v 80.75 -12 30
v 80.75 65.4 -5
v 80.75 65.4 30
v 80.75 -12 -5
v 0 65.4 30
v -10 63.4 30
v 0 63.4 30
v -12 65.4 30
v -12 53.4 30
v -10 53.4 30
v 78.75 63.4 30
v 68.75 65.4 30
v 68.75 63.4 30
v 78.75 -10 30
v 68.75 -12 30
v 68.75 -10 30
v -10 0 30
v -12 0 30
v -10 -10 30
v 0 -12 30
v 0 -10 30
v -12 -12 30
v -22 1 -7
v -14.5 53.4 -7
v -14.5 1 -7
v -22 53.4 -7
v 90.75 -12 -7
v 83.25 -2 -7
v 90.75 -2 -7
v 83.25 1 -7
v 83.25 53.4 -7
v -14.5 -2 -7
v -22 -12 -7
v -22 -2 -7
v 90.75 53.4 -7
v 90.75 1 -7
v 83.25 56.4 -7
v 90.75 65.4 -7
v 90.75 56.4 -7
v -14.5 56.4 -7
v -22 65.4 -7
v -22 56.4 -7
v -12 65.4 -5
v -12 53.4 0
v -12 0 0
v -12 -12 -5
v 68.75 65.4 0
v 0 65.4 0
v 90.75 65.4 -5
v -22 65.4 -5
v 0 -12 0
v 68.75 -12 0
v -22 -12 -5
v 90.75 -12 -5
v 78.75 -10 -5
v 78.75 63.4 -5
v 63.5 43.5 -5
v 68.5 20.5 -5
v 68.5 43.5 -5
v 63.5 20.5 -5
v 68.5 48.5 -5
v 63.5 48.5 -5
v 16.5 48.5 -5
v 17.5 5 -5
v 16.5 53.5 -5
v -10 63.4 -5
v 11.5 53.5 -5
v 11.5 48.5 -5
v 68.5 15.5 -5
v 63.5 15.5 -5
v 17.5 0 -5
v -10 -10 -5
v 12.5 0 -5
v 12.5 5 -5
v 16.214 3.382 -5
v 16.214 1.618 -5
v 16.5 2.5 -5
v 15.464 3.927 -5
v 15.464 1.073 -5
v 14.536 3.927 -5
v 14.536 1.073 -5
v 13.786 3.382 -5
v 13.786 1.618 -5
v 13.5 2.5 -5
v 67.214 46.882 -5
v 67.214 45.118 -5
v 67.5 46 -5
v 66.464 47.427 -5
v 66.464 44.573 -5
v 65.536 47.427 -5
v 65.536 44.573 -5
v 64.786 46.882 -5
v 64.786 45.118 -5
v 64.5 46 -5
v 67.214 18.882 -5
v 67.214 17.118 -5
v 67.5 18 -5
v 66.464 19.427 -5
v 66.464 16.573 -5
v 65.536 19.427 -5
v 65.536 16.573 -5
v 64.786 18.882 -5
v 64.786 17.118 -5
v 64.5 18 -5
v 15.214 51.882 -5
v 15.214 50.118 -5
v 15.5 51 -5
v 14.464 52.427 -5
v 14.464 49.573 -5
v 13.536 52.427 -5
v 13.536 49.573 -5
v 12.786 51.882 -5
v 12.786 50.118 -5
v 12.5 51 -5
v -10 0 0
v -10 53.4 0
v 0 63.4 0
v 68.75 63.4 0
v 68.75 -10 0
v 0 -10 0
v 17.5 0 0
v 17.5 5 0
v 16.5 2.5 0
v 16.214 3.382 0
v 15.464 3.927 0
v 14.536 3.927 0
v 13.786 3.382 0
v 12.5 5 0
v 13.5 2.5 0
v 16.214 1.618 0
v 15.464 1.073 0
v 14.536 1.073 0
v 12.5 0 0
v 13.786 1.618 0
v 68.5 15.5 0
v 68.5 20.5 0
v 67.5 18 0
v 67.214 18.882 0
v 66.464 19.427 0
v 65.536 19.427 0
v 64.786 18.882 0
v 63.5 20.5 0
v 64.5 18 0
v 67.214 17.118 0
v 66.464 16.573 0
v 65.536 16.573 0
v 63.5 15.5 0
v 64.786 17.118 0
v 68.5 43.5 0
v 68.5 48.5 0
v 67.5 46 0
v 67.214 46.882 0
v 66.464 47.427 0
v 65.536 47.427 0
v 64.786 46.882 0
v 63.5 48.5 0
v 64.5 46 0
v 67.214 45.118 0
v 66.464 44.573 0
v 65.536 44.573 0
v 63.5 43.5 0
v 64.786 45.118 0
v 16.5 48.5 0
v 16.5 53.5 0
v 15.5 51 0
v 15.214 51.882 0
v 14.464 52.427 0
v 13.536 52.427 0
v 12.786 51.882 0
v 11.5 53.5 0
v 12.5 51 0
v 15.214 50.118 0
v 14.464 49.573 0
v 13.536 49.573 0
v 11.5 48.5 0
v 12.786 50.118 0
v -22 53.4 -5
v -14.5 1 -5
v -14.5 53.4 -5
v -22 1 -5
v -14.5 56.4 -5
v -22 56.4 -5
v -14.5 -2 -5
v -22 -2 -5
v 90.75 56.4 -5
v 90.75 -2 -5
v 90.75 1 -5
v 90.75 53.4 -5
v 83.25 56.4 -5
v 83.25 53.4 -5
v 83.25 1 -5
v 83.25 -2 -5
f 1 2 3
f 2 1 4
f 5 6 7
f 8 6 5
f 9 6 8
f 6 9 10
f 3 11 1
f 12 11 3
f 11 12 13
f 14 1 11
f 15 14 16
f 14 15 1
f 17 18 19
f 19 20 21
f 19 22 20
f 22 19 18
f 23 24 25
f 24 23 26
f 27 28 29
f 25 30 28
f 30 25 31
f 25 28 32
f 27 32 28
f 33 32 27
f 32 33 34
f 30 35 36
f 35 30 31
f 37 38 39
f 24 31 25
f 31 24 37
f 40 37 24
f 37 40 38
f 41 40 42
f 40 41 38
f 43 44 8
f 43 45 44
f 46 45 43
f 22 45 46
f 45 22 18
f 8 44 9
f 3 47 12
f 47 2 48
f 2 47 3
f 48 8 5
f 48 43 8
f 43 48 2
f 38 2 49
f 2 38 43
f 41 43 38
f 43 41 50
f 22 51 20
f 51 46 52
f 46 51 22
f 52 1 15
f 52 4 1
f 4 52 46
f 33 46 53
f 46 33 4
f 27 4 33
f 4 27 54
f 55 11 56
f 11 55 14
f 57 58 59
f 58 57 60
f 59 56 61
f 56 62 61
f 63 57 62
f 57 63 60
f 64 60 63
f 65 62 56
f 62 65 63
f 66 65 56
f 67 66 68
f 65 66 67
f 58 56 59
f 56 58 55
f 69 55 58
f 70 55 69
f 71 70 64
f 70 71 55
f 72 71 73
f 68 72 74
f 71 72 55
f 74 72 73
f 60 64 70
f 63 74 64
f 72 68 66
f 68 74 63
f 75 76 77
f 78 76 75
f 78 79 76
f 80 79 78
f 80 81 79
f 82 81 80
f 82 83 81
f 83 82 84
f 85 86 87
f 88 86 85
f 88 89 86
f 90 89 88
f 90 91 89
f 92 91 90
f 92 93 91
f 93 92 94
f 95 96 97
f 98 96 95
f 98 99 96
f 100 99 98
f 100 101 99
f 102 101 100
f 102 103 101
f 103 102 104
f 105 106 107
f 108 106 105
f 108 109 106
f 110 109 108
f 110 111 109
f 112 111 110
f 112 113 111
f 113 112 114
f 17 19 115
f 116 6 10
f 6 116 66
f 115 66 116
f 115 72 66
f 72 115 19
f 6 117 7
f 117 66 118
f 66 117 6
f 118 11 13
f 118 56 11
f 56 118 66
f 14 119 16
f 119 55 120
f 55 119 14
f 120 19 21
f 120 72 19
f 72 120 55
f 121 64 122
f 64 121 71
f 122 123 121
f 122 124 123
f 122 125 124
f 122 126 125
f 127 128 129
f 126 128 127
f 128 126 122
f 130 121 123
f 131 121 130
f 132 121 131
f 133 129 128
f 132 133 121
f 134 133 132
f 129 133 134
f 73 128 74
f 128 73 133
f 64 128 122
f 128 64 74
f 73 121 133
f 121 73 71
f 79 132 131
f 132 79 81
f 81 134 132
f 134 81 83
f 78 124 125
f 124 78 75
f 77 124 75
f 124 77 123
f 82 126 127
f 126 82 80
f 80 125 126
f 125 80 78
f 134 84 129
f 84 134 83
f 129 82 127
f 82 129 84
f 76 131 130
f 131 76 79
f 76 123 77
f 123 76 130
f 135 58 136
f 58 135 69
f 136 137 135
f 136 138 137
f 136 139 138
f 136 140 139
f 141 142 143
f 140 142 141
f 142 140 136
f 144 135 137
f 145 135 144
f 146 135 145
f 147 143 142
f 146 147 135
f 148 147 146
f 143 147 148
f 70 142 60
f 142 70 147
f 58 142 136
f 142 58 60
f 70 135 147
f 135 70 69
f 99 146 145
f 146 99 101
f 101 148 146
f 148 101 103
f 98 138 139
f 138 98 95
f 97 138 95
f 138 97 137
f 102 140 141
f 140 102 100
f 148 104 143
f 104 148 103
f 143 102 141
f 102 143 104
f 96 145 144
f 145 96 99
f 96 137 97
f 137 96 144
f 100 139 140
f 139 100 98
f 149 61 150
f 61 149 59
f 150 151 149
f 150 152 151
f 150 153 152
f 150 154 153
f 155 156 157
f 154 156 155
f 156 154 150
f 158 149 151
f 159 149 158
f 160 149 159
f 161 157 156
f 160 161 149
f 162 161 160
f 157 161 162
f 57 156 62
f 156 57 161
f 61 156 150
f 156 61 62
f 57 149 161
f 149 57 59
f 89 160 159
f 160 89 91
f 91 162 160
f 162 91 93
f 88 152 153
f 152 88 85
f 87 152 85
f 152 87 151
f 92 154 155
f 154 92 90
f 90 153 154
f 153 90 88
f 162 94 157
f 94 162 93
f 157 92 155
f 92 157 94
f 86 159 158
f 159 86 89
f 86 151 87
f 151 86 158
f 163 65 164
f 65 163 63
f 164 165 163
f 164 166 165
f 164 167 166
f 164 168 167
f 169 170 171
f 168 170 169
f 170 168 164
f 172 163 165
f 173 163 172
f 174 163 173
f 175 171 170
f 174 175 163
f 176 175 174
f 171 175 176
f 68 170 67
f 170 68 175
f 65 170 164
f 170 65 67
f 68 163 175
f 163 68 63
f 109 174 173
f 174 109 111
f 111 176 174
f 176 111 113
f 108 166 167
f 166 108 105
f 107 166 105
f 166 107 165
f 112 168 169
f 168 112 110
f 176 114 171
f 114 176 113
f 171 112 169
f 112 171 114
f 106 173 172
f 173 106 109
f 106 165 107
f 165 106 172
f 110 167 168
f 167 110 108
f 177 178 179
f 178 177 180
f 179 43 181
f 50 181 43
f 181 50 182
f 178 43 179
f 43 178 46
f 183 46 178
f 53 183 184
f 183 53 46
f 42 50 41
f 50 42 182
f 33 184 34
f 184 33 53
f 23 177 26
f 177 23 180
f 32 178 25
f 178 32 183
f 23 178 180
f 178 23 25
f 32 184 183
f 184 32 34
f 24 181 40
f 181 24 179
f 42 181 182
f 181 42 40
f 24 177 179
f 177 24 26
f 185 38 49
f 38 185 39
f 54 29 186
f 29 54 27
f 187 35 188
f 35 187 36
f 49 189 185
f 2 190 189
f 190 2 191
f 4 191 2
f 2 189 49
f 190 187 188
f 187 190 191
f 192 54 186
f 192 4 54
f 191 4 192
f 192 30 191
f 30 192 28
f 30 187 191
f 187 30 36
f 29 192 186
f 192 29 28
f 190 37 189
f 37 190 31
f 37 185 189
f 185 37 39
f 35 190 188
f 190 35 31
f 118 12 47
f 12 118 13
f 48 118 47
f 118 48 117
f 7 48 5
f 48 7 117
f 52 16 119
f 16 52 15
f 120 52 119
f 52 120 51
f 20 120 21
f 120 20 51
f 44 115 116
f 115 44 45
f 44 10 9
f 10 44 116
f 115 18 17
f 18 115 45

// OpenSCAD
// file: circuitboard-case-v2.scad
//
// THIS FILE DOES NOT RUN STANDALONE
//

//////////////////////////////////////////////
// DRAW MOUNTING BRACKETS FOR CIRCUIT BOARD
//
module drawmount(x,y,z)
{
    difference()
    {
        translate([x-((mount_lb/2)),y-((mount_lb/2)),-board_height])
            cube([mount_lb,mount_lb,board_height],
                center=false);
        
        translate([x,y,-board_height])
            cylinder(h=board_height,r1=mount_holeradius,r2=mount_holeradius,$fn=10);
    }

}

///////////////////////////////
// GENERIC DRAW OF BASIC CASE
//
module genericcase()
{
    x2=max(board_l+(boardspace_left+boardspace_right)+(materialthickness*2),case_l);
    y2=max(board_b+(boardspace_top+boardspace_bottom)+(materialthickness*2),case_b);
    z2=max(board_h+(boardspace_bottom*2)+(materialthickness*2),case_h);

    xa=mountsurfacewidth;
    xb=x2-(mountsurfacewidth+materialthickness);
    ya=mountsurfacewidth;
    yb=y2-(mountsurfacewidth+materialthickness);
    
    difference()
    {
        translate([-(materialthickness+boardspace_left),-(materialthickness+boardspace_bottom),-(materialthickness+board_height)])
            cube([  x2,
                    y2,
                    z2
                ],center=false);
    
    // case space is now at 0,0,0
        translate([-boardspace_left,-boardspace_bottom,-board_height])
            cube([x2-(materialthickness*2),y2-(materialthickness*2),z2+materialthickness+(boardspace_bottom*2)],center=false);
    }
    
    //color([0,0,1])
    //    translate([0,0,-boardspace_bottom])
    //        cube([board_l,board_b,materialthickness]);
    
    for(i = [0 : mountpoints-1]) // for each mountpoint
    {   
        drawmount(mountpointarray[i][0], mountpointarray[i][1],-board_height);
    }
    
    // case mounts
    if (mounttop) 
    {
        translate([-(materialthickness+boardspace_left),y2-(materialthickness+boardspace_bottom),-(materialthickness+board_height)])
            difference()
            {
                cube([x2,mountsurfacewidth,materialthickness],center=false);
                
                translate([xa,mountsurfacewidth*0.25,0])
                    cube([mountscrewwidth,mountsurfacewidth*0.75,materialthickness],center=false);
                
                translate([xb,mountsurfacewidth*0.25,0])
                    cube([mountscrewwidth,mountsurfacewidth*0.75,materialthickness],center=false);
            }
    }
    
    if (mountbottom) 
    {
        translate([-(materialthickness+boardspace_left),-(mountsurfacewidth+boardspace_bottom+materialthickness),-(materialthickness+board_height)])
            difference()
            {
                cube([x2,mountsurfacewidth+1,materialthickness],center=false);
                
                translate([xa,0,0])
                    cube([mountscrewwidth,mountsurfacewidth*0.75,materialthickness],center=false);
                
                translate([xb,0,0])
                    cube([mountscrewwidth,mountsurfacewidth*0.75,materialthickness],center=false);
            }
    }
    
    // case mounts
    if (mountleft) 
    {
        translate([-(mountsurfacewidth+boardspace_left+materialthickness),-(boardspace_bottom+materialthickness),-(materialthickness+board_height)])
            difference()
            {
                cube([mountsurfacewidth,y2,materialthickness],center=false);
                
                translate([0,ya,0])
                    cube([mountsurfacewidth*0.75,mountscrewwidth,materialthickness],center=false);
                
                translate([0,yb,0])
                    cube([mountsurfacewidth*0.75,mountscrewwidth,materialthickness],center=false);
                
                
            }
    }
    
    if (mountright) 
    {
        translate([x2-(boardspace_left+materialthickness),-(boardspace_bottom+materialthickness),-(materialthickness+board_height)])
            difference()
            {
                cube([mountsurfacewidth,y2,materialthickness],center=false);
                
                translate([(mountsurfacewidth*0.25),ya,0])
                    cube([mountsurfacewidth*0.75,mountscrewwidth,materialthickness],center=false);
                
                translate([(mountsurfacewidth*0.25),yb,0])
                    cube([mountsurfacewidth*0.75,mountscrewwidth,materialthickness],center=false);
                
                
            }
    }
}   


///////////////////////////////////
// DRAW OF CASE WITH ALL DETAILS
//
module drawcase()
{   
    x2=max(board_l+(boardspace_left+boardspace_right)+(materialthickness*2),case_l)-(boardspace_left+(materialthickness*2));
    y2=max(board_b+(boardspace_top+boardspace_bottom)+(materialthickness*2),case_b)-(boardspace_bottom+(materialthickness*2));
    z2=max(board_h+(boardspace_bottom+boardspace_top)+(materialthickness*2),case_h);

    difference()
    {
        genericcase();
        
        if (case_open_top)
        {
            translate([0,y2,0])
                cube([board_l,materialthickness,z2]);
        }
        
        if (case_open_bottom)
        {
            translate([0,-boardspace_bottom-materialthickness,0])
                cube([board_l,materialthickness,z2]);
        }
        
        if (case_open_left)
        {
            translate([-boardspace_left-materialthickness,0,0])
                cube([materialthickness,board_b,z2]);
        }
        
        if (case_open_right)
        {
            translate([x2,0,0])
                cube([materialthickness,board_b,z2]);
        }
        
    }
    
}

///////////////////////////////////
// DRAW TOP COVER
//
module drawtopcover()
{
    x2=max(board_l+(boardspace_left+boardspace_right)+(materialthickness*2),case_l);
    y2=max(board_b+(boardspace_top+boardspace_bottom)+(materialthickness*2),case_b);
    
    cube([x2,y2,materialthickness]);
    
    difference()
    {
        translate([materialthickness,materialthickness,materialthickness])
            cube([x2-(materialthickness*2),y2-(materialthickness*2),topcoverbracketheight]);
        
        translate([materialthickness*2,materialthickness*2,materialthickness])
            cube([x2-(materialthickness*4),y2-(materialthickness*4),topcoverbracketheight]);
        
//        translate([materialthickness+coverbracketwidth,materialthickness,materialthickness])
  //          cube([x2-((materialthickness*4)+(coverbracketwidth*2)),y2,coverbracketheight]);
        
        if (coverbracketstyle==1) // corner only style
        {
            translate([materialthickness+coverbracketwidth,materialthickness,materialthickness])
                cube([x2-((materialthickness*2)+(topcoverbracketwidth*2)),y2,topcoverbracketheight]);
        
            translate([materialthickness,materialthickness+coverbracketwidth,materialthickness])
                cube([x2,y2-((materialthickness*2)+(topcoverbracketwidth*2)),topcoverbracketheight]);
        }
    }
}

//
// MODULE-END
///////////////////////////////////////////////////////////////////

///////////////////////////////////////////////////////////////////
// DRAW-BEGIN
//
if (selectdraw==0) 
{
    drawcase();
}
else if (selectdraw==1)
{   
    difference()
    {
        drawtopcover();
        
        cut_topcover();
    }
}

//
// DRAW-BEGIN
//////////////////
// main file
///////////////////////////////////////////////////////////////////
// CIRCUIT BOARD CASING - CONFIGURATION FILE
//

// select what to draw: 0=case, 1=cover
selectdraw=0;   

// general case material thickness(mm)
materialthickness=2;    // [2:5]


///////////////////////////////////////////////////////////////////
// CIRCUIT BOARD DETAILS
//

// circuitboard length in mm 
board_l=68.75; // [20:0.5:200]

// circuitboard width in mm
board_b=53.40; // [20:0.5:200]

// circuitboard board max height in mm
board_h=13; // [10:0.5:100]  only arduino board
//board_h=41; // [10:0.5:100]  arduino board + proto screw shield + lcd 16x2 shield

// circuitboard case space/padding distance left
boardspace_left=10; // [1:0.5:50]     

// circuitboard case space/padding distance right
boardspace_right=10; // [1:0.5:50]         

// circuitboard case space/padding distance top
boardspace_top=10; // [1:0.5:50]           

// circuitboard case space/padding distance bottom
boardspace_bottom=10; // [1:0.5:50]        

// circuitboard mount/space height
board_height=5; // [3:1:20]     


///////////////////////////////////////////////////////////////////
// CASE DETAILS
//

// case open on left side
case_open_left=true;    // [false,true]

// case open on right side
case_open_right=false;   // [false,true]

// case open on top side
case_open_top=true;   // [false,true]  

// case open on bottom side
case_open_bottom=true; // [false,true]

//  case length (0=use board size: autosize, or specify size)
case_l=0;  

// case width  (0=use board size: autosize, or specify size)
case_b=0;  

// case height (0=use board size: autosize, or specify size)
case_h=0;  

// circuitboard mounting/spacer length&width in mm
mount_lb=5; // [3:0.5:6]

// circuitboard mounting screw hole size in radius mm
mount_holeradius=1.5; 

///////////////////////////////////////////////////////////////////
// SIDE MOUNTING BRACKETS
//

// mounting bracket width, additional surface width each side for mount
mountsurfacewidth=10; // [6:0.5:50]

// mounting bracket screw radius
mountscrewwidth=3;    // [3,4,5,6,7,8]

// create mounting bracket on top side
mounttop=false; // [false,true]

// create mounting bracket on bottom side
mountbottom=false; // [false,true]

// create mounting bracket on left side
mountleft=true; // [false,true]

// create mounting bracket on right side
mountright=true; // [false,true]

// number of circuit board mount points
mountpoints=4; // [4,5,6]

// circuit board mount points, [ [x,y], [x,y], [x,y], [x,y] ]
mountpointarray=[ [15,2.5],
                  [66,18],
                  [66,46],
                  [14,51]
                  ];


///////////////////////////////////////////////////////////////////
// TOP COVER DETAILS
//
// set height of top cover bracket
topcoverbracketheight=materialthickness*3;

// set height of top cover bracket
topcoverbracketwidth=mountsurfacewidth;

// cover bracket 0=complete, 1=corners only
topcoverbracketstyle=1;


///////////////////////////////////////////////////////////////////
// SIDE MOUNTING BRACKETS
//
// mounting bracket width, additional surface width each side for mount
mountsurfacewidth=10; // [6:0.5:50]

// mounting bracket screw radius
mountscrewwidth=3;    // [3,4,5,6,7,8]

// create mounting bracket on top side
mounttop=false; // [false,true]

// create mounting bracket on bottom side
mountbottom=false; // [false,true]

// create mounting bracket on left side
mountleft=true; // [false,true]

// create mounting bracket on right side
mountright=true; // [false,true]

///////////////////////////////////////////////////////////////////
// TOP COVER DETAILS
//
// set height of top cover bracket
topcoverbracketheight=materialthickness*3;

// set height of top cover bracket
topcoverbracketwidth=mountsurfacewidth;

// cover bracket 0=complete, 1=corners only
topcoverbracketstyle=1;

// see module drawtopcoverholes() below to apply custom cover details

// CONFIG-END
///////////////////////////////////////////////////////////////////

///////////////////////////////////////////////////////////////////
// MODULE-BEGIN
//
// USE THESE MODULE FUNCTIONS TO CUSTOMIZE YOUR CASE
//
module cut_topcover()
{
    /////////////////////////////////////////////////////////////////
    // take out comments below and use this  to drill holes ;-) 
    // EXAMPLE:
    // x=20; // xpos      (0..boardlength)
    // y=20; // ypos      (0..boardwidth)
    // d=5;  // diameter  (diameter in mm)
    // translate([x,y,0])
    //    cylinder(h=board_height,r1=d,r2=d,$fn=10);
    //
    // repeat if needed more holes
    //

}

//
// MODULE-BEGIN
///////////////////////////////////////////////////////////////////



include <circuitboard-case-v2.scad>
